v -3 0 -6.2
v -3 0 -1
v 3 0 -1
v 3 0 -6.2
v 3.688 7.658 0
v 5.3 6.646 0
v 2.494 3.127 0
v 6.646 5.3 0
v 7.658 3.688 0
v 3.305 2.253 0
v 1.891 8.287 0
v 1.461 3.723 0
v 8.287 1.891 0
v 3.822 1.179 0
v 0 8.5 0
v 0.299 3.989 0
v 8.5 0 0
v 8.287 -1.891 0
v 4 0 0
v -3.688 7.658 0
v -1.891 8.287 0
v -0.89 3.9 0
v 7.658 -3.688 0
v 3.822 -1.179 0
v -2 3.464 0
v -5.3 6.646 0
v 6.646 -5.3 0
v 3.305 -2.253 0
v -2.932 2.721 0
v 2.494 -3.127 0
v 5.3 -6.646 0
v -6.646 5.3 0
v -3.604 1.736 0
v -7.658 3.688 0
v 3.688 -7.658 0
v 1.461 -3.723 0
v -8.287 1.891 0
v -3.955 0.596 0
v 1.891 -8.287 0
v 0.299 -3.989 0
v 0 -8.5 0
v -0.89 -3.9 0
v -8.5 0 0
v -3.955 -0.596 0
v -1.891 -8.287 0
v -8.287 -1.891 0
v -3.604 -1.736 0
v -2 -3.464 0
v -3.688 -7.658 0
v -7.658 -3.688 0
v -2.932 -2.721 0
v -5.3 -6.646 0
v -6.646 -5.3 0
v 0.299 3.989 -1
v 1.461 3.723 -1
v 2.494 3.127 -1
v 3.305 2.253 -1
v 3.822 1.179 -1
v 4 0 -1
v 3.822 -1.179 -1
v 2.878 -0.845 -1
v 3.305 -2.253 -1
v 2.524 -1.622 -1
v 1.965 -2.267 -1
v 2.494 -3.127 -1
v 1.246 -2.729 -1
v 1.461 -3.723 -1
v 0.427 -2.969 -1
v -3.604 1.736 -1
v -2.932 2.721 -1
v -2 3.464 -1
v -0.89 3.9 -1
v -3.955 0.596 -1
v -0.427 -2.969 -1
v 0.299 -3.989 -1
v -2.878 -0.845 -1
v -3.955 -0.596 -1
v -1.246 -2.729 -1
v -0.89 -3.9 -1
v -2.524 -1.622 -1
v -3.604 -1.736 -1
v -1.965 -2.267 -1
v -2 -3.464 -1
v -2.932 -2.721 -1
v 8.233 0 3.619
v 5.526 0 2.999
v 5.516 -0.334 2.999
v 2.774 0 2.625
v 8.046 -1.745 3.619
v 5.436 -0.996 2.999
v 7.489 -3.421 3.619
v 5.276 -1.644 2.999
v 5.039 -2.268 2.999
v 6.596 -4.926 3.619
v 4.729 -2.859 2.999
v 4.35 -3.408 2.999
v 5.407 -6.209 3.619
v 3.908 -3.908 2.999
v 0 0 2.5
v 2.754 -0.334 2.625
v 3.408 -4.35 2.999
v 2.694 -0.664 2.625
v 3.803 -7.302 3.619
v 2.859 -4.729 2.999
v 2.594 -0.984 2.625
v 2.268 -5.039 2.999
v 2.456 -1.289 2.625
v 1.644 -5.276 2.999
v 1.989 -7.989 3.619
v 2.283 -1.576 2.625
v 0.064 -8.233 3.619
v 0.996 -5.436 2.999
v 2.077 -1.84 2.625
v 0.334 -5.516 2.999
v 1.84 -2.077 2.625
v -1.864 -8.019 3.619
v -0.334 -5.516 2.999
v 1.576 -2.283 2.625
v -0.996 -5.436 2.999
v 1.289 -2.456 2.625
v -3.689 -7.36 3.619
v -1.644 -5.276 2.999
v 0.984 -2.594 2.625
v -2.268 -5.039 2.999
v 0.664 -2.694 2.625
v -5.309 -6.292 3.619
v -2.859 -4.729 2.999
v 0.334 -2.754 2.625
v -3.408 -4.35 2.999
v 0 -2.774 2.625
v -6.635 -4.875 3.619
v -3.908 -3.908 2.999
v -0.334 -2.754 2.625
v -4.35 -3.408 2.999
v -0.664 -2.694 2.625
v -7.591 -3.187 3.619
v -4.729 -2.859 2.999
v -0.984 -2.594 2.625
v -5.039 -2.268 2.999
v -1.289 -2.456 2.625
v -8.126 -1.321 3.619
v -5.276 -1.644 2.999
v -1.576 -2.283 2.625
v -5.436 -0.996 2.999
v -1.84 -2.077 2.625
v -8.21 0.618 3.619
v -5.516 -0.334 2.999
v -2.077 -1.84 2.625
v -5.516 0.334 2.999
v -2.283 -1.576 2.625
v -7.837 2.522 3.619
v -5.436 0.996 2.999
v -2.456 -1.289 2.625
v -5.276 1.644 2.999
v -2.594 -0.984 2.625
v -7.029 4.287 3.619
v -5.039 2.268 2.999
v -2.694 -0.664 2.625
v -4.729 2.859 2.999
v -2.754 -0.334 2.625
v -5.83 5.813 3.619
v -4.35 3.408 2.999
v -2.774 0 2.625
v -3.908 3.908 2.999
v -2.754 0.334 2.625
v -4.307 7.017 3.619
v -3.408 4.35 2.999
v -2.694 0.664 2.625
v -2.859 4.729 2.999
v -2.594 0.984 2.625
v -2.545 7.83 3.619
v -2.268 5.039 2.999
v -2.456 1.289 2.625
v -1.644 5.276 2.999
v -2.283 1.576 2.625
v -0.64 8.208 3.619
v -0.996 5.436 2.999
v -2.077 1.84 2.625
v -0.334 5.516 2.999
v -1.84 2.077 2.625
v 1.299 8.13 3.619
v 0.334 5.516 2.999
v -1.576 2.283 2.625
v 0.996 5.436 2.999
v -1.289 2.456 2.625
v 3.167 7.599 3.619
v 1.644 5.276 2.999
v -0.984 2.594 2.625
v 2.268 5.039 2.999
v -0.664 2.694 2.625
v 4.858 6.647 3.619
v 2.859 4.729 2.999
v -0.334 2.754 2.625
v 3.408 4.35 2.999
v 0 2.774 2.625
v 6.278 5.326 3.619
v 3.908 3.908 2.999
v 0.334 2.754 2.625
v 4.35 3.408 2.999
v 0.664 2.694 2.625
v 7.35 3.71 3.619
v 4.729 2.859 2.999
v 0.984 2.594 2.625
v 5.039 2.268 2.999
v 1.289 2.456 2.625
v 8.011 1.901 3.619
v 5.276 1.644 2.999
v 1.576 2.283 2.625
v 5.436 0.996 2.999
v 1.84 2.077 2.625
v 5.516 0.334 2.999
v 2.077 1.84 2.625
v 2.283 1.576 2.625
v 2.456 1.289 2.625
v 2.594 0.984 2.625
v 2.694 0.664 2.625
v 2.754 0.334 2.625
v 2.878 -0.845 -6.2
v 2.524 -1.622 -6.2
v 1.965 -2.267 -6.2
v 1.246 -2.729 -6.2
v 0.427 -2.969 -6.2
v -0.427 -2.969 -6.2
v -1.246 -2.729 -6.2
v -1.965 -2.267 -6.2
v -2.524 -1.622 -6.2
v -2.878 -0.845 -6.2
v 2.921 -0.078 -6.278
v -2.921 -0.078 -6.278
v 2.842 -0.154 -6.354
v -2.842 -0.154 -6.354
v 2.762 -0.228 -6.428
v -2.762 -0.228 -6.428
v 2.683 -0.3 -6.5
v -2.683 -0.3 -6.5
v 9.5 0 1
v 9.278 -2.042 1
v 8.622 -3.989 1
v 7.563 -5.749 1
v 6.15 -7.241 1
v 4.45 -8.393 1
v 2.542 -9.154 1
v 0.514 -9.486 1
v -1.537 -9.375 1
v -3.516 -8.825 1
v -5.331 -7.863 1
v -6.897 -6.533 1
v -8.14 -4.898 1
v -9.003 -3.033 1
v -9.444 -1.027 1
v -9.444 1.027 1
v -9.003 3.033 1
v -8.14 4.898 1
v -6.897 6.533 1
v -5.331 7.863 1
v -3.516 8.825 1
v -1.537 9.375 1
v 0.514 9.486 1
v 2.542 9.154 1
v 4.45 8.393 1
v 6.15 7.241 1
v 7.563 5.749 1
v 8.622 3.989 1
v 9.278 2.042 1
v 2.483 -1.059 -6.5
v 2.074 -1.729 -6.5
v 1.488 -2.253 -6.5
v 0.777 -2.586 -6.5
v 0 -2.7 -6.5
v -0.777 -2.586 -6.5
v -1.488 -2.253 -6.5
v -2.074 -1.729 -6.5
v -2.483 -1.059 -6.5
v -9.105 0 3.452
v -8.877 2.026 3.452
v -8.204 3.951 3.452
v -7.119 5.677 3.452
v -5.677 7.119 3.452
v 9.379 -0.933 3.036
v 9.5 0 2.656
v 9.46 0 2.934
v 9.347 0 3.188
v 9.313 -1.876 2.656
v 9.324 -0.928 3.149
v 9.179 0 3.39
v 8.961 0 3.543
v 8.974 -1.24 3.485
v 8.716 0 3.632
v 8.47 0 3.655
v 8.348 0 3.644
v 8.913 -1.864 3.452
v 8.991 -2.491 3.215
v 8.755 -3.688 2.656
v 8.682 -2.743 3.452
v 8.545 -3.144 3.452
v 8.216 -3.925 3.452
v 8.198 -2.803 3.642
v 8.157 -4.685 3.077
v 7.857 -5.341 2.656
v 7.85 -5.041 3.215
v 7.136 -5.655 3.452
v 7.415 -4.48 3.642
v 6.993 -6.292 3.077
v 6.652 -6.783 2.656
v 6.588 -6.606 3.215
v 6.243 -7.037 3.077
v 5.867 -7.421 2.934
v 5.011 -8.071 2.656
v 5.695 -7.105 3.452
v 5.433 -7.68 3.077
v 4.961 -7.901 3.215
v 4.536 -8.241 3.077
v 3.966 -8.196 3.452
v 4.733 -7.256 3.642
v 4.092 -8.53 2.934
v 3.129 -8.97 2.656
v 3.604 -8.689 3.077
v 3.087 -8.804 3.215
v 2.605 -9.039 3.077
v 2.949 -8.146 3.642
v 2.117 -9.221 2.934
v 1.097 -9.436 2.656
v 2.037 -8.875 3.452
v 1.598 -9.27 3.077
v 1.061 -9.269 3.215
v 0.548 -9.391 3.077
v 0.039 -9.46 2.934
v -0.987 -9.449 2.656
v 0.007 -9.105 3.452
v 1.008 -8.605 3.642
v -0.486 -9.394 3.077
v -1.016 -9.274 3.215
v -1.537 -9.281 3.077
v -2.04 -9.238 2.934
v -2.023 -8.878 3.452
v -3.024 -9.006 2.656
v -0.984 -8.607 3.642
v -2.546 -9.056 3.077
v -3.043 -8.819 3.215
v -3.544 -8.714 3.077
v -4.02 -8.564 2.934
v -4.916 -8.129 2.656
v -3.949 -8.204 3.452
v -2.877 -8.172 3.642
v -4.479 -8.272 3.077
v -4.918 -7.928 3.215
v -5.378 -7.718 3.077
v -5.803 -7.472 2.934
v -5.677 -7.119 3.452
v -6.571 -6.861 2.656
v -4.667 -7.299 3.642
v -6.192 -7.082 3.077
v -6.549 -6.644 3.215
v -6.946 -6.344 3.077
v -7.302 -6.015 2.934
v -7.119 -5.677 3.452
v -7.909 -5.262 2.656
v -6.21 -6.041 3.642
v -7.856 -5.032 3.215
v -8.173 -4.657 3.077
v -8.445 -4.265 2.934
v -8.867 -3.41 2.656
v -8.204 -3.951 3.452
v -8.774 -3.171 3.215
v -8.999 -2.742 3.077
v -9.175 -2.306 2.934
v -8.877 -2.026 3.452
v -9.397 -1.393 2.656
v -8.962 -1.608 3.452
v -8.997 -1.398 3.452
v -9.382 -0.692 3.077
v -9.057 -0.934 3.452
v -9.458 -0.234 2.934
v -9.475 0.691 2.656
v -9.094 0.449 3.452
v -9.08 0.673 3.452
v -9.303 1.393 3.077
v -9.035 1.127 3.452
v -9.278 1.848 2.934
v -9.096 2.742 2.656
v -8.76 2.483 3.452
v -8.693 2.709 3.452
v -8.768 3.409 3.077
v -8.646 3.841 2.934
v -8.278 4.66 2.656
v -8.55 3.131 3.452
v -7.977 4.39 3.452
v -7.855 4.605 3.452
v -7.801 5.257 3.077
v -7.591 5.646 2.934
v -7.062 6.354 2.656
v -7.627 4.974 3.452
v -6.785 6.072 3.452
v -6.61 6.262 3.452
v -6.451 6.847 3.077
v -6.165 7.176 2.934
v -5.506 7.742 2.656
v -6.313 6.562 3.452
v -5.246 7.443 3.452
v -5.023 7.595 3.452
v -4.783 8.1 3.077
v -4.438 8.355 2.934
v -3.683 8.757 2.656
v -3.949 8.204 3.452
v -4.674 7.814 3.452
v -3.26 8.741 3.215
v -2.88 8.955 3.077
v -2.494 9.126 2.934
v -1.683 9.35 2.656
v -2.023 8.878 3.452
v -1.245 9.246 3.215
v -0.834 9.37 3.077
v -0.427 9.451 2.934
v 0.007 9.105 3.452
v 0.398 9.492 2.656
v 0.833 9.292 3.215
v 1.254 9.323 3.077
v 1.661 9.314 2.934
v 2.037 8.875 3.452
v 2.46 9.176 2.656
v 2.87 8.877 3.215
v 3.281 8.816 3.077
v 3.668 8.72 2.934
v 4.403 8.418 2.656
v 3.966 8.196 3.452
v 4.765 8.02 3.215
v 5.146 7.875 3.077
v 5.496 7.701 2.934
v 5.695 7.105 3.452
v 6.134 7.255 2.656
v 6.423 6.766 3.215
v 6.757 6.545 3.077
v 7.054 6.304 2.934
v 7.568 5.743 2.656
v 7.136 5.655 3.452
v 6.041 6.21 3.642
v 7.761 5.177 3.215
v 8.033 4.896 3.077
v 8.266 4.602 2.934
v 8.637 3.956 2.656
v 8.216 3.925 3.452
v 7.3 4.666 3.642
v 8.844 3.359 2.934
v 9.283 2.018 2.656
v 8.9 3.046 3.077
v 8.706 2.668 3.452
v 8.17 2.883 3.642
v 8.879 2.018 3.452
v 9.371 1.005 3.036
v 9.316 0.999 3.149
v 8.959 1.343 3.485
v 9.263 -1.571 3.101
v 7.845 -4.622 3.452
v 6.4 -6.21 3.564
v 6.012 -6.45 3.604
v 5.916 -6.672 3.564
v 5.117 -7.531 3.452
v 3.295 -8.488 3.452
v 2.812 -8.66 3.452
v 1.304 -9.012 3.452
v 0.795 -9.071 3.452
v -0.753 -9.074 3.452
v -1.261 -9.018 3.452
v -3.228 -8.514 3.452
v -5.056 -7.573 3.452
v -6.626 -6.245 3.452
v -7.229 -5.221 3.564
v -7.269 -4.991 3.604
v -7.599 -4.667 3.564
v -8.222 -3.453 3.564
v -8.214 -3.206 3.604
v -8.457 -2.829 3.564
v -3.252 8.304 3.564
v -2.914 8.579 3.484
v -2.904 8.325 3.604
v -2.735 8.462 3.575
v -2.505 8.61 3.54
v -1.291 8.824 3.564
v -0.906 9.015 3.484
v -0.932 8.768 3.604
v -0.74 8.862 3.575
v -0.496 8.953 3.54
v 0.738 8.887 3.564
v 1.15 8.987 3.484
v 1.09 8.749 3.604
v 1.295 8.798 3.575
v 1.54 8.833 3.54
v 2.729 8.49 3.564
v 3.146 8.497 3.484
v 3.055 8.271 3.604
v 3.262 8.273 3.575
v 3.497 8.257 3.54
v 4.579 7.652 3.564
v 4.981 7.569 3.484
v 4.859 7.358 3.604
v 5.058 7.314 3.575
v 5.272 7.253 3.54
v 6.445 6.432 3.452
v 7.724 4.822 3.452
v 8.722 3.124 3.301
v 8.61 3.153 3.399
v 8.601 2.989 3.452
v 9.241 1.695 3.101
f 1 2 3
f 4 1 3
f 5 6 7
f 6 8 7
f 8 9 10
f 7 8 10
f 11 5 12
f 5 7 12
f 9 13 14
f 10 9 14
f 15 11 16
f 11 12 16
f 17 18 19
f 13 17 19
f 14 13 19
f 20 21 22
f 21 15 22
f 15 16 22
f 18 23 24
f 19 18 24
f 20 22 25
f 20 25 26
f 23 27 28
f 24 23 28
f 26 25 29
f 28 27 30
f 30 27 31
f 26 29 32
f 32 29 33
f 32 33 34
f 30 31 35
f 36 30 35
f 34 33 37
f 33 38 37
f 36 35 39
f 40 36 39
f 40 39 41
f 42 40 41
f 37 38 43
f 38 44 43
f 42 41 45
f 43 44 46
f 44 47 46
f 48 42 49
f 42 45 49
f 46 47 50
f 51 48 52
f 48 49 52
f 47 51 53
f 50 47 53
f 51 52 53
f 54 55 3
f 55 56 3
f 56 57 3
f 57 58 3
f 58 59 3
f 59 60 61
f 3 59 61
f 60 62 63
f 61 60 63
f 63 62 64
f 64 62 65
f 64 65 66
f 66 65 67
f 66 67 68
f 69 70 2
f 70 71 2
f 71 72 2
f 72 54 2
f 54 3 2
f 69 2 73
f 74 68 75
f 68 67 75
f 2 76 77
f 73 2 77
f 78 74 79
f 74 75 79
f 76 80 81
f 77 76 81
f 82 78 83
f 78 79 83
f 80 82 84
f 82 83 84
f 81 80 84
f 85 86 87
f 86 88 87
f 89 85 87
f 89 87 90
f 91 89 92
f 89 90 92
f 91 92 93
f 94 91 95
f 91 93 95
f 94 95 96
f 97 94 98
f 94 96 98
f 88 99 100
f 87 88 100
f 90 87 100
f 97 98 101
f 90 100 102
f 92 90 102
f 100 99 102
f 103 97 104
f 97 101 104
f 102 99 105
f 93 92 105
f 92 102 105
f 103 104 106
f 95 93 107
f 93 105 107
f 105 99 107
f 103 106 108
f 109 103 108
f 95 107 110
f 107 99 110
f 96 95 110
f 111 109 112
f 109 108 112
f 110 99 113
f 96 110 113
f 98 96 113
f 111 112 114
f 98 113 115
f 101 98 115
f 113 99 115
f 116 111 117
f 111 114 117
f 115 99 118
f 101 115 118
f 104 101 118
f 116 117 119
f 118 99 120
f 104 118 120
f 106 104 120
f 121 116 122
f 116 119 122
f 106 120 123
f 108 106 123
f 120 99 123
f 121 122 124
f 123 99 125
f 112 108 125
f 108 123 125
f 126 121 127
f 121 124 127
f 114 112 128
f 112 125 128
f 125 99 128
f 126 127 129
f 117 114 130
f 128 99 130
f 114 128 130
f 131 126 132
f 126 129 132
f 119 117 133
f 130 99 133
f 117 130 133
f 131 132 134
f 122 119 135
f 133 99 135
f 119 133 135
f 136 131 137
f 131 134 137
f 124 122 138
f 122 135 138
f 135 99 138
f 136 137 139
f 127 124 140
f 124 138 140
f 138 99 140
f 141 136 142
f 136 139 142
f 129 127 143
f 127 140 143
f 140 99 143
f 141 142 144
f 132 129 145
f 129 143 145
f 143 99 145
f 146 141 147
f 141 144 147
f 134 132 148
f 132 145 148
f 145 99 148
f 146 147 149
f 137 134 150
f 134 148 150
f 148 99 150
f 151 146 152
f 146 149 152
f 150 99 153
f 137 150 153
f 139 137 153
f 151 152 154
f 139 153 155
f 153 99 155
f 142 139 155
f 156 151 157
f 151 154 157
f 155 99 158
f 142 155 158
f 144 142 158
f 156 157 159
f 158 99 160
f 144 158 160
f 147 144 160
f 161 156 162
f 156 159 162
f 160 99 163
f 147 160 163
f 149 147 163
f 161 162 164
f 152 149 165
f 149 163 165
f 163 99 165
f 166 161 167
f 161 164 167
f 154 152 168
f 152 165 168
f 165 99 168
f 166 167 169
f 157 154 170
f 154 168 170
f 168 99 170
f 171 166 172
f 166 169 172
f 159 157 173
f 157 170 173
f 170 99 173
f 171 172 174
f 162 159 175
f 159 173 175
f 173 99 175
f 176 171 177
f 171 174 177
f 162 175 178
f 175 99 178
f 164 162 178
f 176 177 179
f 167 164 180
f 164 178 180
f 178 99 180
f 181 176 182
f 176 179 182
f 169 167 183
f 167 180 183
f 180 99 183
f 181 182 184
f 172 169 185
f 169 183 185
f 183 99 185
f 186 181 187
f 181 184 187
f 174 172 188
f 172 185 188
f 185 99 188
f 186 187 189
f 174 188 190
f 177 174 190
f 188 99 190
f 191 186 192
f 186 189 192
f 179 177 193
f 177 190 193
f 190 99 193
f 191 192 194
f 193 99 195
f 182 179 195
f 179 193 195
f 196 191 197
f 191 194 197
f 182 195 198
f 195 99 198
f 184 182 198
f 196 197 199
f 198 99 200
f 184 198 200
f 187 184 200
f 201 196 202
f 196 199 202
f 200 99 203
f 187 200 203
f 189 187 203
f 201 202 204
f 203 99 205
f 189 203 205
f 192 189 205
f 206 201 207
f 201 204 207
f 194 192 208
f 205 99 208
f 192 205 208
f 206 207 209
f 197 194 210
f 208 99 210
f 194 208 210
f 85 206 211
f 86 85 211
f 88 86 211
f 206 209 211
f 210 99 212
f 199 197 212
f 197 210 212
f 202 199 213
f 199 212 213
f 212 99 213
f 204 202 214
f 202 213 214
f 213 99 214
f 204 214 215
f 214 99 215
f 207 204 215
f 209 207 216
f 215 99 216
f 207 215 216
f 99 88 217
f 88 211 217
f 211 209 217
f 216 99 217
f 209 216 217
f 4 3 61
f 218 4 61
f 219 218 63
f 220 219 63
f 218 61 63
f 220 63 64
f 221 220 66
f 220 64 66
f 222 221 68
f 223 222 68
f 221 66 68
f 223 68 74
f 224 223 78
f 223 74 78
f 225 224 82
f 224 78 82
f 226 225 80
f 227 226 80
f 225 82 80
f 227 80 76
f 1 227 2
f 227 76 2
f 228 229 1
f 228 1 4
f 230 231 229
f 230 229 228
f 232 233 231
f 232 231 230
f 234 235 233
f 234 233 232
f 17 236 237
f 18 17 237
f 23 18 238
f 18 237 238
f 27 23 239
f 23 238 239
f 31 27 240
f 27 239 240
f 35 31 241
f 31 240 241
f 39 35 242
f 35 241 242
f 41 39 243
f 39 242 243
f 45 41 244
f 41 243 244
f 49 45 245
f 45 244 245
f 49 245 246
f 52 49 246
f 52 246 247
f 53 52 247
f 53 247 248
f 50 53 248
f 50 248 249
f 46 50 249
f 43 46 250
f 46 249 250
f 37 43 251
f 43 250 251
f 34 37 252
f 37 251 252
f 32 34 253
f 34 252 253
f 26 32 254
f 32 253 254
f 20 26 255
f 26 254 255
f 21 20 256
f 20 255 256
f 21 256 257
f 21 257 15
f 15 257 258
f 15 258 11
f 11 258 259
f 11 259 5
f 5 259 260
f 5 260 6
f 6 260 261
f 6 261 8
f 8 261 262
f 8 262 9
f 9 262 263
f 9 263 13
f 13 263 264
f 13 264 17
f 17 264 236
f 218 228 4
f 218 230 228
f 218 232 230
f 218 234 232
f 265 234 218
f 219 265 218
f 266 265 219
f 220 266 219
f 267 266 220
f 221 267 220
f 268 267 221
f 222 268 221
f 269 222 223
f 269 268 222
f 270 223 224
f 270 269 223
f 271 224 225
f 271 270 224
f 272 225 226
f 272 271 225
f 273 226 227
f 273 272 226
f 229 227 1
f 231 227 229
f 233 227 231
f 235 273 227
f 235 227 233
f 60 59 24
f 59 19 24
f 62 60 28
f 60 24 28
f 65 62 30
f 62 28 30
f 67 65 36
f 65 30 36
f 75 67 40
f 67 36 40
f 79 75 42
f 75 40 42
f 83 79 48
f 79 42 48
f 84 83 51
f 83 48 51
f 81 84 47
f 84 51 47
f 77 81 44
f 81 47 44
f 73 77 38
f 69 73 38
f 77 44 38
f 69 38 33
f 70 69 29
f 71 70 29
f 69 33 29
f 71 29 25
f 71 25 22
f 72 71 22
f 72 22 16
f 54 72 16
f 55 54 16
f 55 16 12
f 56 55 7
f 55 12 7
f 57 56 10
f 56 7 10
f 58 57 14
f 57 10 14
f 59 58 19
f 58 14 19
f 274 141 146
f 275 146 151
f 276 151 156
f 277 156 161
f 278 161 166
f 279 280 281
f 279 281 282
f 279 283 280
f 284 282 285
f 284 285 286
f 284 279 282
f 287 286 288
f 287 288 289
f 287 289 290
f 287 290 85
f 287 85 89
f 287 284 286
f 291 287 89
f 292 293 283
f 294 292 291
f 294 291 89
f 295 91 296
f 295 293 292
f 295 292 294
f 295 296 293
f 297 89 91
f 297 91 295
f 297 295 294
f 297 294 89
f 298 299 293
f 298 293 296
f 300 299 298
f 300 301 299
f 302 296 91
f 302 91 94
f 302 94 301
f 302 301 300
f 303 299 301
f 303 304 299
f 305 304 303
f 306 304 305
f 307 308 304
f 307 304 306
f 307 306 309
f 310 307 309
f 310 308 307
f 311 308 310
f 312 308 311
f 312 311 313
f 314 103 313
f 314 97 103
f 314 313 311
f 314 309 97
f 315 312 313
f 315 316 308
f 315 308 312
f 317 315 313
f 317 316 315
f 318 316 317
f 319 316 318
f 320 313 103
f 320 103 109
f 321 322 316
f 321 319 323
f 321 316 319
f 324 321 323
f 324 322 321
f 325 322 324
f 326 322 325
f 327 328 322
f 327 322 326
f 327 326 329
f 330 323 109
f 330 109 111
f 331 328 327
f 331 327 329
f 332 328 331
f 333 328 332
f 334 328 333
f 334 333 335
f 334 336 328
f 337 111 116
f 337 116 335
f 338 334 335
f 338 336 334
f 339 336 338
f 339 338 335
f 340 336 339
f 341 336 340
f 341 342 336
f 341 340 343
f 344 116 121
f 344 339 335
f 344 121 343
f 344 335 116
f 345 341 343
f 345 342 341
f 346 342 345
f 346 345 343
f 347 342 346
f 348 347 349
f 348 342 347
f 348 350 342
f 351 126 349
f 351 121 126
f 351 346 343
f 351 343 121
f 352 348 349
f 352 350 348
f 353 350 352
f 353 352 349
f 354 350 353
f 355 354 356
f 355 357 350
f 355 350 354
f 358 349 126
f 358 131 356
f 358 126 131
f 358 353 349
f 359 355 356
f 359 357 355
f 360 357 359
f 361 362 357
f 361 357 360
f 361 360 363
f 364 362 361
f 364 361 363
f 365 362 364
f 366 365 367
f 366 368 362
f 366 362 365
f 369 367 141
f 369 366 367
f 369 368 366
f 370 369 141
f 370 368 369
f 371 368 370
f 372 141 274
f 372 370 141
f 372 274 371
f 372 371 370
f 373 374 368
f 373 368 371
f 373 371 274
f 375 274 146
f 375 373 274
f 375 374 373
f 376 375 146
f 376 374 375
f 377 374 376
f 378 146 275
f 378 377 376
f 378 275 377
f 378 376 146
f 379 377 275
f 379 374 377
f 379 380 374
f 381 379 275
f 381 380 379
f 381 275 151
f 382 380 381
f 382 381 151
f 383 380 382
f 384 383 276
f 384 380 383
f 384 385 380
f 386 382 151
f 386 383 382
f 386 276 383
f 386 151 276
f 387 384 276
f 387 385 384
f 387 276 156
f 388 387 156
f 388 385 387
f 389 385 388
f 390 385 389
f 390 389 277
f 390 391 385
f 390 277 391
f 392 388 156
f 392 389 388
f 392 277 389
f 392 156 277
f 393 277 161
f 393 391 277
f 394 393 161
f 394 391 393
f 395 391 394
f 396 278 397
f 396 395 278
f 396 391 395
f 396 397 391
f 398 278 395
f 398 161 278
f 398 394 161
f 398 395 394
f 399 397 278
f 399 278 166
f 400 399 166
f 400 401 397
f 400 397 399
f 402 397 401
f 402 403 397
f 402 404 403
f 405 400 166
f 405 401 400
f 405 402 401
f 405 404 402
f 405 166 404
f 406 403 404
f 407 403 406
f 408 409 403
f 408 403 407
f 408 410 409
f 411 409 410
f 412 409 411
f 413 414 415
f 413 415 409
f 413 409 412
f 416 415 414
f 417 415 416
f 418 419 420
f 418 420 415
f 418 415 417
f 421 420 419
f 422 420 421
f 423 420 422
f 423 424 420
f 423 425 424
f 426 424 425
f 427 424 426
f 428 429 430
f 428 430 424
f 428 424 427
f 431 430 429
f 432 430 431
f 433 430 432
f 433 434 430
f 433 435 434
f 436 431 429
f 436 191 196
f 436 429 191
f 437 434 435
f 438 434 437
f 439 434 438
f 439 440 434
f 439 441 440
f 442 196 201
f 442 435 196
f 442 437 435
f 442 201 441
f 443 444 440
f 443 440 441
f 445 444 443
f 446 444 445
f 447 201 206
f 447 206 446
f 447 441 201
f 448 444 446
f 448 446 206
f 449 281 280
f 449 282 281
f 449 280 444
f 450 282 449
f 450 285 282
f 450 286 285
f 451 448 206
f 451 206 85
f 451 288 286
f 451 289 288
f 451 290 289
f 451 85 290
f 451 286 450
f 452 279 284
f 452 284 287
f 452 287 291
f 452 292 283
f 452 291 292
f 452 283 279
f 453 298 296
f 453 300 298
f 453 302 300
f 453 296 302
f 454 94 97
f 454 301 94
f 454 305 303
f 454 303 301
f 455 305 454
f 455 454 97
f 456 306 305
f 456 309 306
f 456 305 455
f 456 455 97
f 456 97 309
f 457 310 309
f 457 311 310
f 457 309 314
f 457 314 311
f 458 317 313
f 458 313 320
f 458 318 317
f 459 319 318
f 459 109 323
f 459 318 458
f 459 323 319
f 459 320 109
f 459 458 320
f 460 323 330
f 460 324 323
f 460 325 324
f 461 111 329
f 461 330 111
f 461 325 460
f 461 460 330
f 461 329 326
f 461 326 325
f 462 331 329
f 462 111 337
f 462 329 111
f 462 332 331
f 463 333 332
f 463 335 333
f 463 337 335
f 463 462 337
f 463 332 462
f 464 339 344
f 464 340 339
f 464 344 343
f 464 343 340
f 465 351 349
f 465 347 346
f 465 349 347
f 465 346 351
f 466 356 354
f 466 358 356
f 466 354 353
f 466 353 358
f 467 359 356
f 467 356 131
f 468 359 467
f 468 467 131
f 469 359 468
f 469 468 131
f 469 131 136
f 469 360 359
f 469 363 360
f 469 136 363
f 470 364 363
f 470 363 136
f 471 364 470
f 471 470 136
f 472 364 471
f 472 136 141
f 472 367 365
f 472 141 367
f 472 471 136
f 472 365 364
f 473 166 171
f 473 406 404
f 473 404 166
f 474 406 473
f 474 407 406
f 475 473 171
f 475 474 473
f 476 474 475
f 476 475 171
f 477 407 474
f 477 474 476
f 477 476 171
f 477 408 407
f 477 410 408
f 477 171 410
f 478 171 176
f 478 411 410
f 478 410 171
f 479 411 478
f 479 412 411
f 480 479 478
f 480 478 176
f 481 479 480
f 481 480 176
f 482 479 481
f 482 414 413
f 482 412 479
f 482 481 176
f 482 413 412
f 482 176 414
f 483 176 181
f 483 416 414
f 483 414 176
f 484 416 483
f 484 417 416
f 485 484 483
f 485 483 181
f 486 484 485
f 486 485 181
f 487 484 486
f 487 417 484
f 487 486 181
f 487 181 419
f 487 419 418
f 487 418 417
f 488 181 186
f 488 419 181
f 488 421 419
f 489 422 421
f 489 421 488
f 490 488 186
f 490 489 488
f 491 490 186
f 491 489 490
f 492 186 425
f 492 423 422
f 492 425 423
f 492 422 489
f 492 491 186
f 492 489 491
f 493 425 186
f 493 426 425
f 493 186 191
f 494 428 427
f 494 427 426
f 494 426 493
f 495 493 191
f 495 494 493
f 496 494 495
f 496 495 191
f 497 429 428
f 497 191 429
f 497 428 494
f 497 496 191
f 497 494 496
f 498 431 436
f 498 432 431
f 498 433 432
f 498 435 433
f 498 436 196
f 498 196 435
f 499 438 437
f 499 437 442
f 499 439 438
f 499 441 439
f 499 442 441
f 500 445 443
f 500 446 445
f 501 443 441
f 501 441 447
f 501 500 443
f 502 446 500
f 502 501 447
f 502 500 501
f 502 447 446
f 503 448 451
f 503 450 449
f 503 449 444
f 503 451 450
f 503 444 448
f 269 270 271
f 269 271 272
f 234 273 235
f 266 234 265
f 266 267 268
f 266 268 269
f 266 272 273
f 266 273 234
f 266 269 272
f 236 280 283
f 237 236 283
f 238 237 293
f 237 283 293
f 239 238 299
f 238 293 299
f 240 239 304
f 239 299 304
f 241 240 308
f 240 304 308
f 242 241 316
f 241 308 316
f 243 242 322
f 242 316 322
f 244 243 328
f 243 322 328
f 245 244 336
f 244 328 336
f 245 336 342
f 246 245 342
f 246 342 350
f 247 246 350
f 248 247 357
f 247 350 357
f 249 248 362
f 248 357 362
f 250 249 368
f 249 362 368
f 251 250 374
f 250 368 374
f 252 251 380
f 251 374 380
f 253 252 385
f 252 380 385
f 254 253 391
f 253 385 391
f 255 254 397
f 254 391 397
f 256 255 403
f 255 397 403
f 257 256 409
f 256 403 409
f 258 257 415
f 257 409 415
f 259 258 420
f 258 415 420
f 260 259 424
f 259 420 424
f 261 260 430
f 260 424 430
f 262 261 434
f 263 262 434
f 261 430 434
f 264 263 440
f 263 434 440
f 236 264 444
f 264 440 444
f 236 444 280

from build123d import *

# Parameters (mm, degrees)
F0_W     = 4
F0_H     = 1
F2_SIZE  = 1
F3_R     = 1
F5_DEPTH = 5.5
F6_SIZE  = 0.3


with BuildPart() as f1:
    # F0 (on Front) → F1 (revolve)
    with BuildSketch(Plane.XZ):
        with BuildLine():
            ThreePointArc((9.5, 4), (4.8088460154, 2.877308569), (0, 2.5))
            Line((0, 2.5), (0, 0))
            Line((0, 0), (4, 0))
            Line((4, 0), (9.5, 0))
            Line((9.5, 0), (9.5, 4))
        make_face()
        with Locations((2, -0.5)):
            Rectangle(F0_W, F0_H)
    revolve(axis=Axis((0, 0, 1.25), (0, 0, -1)))

    # F2
    f2_edges = [f1.edges().sort_by_distance(p)[0] for p in [
        (-9.5, 0, 0),
    ]]
    chamfer(f2_edges, length=F2_SIZE)

    # F3
    f3_edges = [f1.edges().sort_by_distance(p)[0] for p in [
        (-9.5, 0, 4),
    ]]
    fillet(f3_edges, radius=F3_R)

    # F4 (on face) → F5 (join)
    with BuildSketch(Plane(origin=(0, 0, -1), x_dir=(1, 0, 0), z_dir=(0, 0, -1))):
        with BuildLine():
            Line((-3, 0), (3, 0))
            ThreePointArc((3, 0), (0, 3), (-3, 0))
        make_face()
    extrude(amount=F5_DEPTH)

    # F6
    f6_edges = [f1.edges().sort_by_distance(p)[0] for p in [
        (0, 0, -6.5),
        (0, -3, -6.5),
    ]]
    chamfer(f6_edges, length=F6_SIZE)


solid = f1.part
